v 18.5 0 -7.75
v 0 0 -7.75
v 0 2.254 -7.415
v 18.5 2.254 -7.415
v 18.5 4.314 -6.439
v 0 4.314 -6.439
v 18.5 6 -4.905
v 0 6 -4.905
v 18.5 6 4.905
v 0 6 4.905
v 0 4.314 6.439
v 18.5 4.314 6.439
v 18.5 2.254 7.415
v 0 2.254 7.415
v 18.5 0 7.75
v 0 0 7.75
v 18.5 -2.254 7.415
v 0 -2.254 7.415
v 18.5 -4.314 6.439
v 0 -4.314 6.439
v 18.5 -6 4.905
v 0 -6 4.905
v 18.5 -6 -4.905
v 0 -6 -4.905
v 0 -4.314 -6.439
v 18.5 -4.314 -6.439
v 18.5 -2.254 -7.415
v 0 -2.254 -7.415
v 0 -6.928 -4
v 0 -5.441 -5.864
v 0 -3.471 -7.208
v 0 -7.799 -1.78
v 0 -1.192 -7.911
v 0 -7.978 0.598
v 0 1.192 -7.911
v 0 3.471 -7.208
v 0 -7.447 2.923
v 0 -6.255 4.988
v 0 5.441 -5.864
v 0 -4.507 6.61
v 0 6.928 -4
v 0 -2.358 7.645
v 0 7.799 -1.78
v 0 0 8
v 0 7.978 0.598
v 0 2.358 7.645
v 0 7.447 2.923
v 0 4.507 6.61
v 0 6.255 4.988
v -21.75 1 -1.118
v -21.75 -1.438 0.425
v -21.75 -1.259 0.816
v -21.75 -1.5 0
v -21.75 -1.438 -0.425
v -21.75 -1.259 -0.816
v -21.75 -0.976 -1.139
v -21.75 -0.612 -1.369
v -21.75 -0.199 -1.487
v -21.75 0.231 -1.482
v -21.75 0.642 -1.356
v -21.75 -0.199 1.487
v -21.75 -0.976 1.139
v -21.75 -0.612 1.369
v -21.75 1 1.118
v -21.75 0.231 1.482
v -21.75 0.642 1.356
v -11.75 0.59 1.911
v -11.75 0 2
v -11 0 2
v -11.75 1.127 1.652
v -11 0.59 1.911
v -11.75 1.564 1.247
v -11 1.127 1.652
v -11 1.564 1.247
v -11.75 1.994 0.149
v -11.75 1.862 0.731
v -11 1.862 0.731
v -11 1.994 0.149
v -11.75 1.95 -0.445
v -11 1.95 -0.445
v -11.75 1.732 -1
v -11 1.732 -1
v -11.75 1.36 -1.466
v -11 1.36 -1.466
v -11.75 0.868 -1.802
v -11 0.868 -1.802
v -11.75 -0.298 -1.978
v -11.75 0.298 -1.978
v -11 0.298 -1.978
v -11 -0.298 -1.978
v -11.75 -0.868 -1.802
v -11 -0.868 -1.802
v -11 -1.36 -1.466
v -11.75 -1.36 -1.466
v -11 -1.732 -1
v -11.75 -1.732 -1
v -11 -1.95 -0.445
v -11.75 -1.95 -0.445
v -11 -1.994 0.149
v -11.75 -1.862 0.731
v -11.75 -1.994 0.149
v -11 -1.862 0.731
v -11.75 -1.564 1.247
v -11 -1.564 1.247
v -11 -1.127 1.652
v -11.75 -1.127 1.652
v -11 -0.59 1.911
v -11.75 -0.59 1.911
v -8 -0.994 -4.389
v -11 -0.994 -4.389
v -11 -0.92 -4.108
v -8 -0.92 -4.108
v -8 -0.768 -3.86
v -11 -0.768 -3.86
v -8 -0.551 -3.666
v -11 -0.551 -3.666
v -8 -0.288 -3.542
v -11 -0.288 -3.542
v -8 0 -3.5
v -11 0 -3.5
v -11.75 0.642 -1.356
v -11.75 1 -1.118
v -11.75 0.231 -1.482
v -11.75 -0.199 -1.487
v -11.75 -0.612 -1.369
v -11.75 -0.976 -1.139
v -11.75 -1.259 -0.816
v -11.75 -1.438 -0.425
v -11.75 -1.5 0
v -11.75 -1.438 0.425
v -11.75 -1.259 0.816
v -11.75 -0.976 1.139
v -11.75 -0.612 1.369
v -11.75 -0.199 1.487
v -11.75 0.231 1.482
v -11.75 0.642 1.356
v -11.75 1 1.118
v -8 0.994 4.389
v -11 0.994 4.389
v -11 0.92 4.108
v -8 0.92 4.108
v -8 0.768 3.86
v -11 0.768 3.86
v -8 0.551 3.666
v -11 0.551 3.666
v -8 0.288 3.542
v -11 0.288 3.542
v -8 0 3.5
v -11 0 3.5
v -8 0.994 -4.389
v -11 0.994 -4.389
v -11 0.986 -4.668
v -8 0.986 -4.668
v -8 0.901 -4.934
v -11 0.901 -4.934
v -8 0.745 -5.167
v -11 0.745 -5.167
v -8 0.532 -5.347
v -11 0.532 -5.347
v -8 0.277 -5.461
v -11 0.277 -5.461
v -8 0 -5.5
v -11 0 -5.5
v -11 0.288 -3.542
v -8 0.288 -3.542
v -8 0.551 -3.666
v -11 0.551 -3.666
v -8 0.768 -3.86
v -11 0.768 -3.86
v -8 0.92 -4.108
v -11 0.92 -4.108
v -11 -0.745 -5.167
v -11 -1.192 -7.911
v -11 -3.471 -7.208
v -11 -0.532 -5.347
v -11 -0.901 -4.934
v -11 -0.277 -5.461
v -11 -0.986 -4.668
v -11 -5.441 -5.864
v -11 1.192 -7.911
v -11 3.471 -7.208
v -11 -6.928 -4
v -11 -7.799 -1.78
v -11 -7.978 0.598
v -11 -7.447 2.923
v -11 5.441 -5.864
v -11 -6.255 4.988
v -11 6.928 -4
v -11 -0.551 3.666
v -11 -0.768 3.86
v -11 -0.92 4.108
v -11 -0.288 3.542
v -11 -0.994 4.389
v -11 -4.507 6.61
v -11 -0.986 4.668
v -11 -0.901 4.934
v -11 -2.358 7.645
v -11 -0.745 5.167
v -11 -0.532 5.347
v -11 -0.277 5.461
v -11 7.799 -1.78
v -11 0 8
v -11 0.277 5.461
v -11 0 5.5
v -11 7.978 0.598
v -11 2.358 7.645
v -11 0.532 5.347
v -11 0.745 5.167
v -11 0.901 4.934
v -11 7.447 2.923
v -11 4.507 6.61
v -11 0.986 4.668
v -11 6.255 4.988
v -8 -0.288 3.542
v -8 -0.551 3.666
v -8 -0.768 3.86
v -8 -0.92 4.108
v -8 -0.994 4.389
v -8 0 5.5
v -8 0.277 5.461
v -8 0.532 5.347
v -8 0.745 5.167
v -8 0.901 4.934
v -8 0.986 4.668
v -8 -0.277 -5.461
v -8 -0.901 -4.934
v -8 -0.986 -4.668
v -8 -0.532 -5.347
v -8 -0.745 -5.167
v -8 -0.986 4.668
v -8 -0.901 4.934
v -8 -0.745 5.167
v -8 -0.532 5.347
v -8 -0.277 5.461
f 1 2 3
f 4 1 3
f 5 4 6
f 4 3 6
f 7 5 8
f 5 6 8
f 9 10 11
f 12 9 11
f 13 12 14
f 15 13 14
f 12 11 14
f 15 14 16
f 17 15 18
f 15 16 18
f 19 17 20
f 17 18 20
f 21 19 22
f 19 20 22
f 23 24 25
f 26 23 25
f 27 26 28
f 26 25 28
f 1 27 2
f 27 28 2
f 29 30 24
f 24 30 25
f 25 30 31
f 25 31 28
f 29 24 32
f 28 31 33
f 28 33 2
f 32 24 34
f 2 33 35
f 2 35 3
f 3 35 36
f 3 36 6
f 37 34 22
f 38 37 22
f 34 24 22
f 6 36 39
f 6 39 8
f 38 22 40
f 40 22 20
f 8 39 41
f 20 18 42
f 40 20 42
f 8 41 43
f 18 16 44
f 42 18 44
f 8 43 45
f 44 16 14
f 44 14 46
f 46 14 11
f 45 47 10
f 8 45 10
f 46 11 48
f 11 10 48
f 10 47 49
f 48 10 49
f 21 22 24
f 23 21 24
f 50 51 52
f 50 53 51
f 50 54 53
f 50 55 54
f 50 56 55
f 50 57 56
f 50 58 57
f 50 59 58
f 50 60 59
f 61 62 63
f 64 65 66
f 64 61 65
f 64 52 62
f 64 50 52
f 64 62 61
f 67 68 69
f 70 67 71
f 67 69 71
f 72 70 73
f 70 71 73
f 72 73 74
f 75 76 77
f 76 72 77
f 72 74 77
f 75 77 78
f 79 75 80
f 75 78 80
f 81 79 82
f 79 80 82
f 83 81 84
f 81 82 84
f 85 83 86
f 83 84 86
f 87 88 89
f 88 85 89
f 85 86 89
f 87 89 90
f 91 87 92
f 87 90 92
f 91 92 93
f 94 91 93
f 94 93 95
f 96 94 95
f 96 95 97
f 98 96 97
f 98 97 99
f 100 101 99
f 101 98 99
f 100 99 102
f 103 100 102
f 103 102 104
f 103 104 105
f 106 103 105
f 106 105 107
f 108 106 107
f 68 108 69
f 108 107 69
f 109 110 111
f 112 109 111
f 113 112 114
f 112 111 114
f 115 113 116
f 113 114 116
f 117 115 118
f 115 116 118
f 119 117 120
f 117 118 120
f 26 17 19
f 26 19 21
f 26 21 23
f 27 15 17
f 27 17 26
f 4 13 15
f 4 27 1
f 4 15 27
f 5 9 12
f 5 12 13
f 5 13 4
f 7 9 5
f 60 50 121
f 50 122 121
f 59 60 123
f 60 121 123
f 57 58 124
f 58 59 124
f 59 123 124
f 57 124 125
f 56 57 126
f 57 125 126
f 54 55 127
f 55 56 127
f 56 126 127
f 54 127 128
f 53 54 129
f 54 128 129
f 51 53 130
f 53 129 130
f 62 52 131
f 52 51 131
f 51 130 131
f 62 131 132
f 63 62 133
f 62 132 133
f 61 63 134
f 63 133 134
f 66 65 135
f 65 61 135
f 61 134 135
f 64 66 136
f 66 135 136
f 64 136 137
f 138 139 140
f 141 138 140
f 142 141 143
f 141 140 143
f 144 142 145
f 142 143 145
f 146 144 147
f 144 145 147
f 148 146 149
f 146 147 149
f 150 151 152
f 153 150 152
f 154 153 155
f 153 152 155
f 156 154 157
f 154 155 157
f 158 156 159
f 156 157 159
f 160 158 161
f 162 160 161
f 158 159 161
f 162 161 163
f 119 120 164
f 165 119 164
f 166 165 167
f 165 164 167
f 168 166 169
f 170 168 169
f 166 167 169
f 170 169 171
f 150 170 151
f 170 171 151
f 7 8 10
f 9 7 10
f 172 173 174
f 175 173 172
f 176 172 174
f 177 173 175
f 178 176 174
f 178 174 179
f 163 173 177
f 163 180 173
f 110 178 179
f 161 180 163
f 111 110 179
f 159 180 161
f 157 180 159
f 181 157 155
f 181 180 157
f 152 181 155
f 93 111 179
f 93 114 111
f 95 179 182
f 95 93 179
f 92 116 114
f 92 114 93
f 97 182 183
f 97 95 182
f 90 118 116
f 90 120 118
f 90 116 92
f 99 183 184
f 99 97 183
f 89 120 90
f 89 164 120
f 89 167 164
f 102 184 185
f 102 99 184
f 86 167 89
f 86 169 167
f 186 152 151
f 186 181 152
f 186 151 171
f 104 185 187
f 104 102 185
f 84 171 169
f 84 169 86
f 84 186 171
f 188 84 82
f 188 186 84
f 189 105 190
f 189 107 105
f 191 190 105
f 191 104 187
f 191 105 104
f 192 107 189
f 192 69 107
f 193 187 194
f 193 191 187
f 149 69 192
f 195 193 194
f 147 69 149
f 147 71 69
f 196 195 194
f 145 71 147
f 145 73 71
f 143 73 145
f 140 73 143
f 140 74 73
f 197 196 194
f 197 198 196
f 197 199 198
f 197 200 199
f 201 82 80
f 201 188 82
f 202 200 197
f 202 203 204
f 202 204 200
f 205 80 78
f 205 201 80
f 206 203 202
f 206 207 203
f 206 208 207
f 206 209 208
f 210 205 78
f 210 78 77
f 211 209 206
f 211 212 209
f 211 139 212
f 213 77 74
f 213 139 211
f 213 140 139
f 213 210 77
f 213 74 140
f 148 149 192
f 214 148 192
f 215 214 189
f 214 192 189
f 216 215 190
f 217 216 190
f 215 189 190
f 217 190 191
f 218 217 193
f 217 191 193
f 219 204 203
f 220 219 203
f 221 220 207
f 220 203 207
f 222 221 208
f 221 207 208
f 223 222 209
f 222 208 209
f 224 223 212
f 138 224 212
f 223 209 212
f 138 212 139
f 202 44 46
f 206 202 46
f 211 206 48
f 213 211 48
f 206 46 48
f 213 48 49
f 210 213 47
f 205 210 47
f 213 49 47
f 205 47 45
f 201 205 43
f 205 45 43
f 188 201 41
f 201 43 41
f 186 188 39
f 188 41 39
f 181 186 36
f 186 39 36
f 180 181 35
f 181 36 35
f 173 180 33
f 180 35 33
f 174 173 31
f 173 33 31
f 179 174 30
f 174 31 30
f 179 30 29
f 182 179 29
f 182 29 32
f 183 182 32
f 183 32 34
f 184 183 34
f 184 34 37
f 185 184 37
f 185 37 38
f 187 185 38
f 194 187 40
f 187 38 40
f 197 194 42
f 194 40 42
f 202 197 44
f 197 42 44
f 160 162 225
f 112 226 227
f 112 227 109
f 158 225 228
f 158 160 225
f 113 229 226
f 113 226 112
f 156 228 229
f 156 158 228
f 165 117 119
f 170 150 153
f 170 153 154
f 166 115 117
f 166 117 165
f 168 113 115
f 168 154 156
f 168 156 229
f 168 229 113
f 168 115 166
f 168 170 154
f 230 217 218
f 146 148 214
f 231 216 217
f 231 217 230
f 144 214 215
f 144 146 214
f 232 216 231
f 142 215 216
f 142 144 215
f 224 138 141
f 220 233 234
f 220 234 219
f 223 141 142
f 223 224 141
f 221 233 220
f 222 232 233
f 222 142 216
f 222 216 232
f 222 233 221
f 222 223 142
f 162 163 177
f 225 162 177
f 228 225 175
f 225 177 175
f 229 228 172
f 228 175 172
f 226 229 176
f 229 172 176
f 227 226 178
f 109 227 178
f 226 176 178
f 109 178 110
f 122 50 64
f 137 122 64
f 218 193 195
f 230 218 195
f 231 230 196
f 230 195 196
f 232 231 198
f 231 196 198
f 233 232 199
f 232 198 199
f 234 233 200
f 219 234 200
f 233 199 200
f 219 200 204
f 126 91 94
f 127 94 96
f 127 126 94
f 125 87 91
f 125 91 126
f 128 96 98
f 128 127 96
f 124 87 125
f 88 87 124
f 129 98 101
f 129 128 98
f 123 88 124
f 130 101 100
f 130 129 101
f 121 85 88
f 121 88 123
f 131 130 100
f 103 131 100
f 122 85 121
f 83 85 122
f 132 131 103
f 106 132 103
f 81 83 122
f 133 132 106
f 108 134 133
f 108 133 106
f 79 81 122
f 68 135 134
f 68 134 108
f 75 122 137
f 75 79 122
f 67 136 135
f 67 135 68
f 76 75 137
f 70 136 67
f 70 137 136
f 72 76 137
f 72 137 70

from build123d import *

# Parameters (mm, degrees)
BOSS_EXTRUDE1_DEPTH = 18.5
SKETCH3_R           = 8
BOSS_EXTRUDE2_DEPTH = 11
SKETCH4_R           = 2
BOSS_EXTRUDE3_DEPTH = 0.75
SKETCH6_R           = 1.5
BOSS_EXTRUDE4_DEPTH = 10
CUT_EXTRUDE1_DEPTH  = 10
CUT_EXTRUDE2_DEPTH  = 3


with BuildPart() as part:
    # Sketch2 → Boss-Extrude1 (new body)
    with BuildSketch(Plane(origin=(0, 0, 0), x_dir=(0, 0, -1), z_dir=(1, 0, 0))):
        with BuildLine():
            Line((0, 6), (-4.905354218, 6))
            ThreePointArc((-4.905354218, 6), (-7.75, 0), (-4.905354218, -6))
            Line((-4.905354218, -6), (0, -6))
            Line((0, -6), (0, 6))
        make_face()
        with BuildLine():
            Line((4.905354218, 6), (0, 6))
            Line((0, 6), (0, -6))
            Line((0, -6), (4.905354218, -6))
            ThreePointArc((4.905354218, -6), (7.002820688, -3.320090723), (7.75, 0))
            ThreePointArc((7.75, 0), (7.002820688, 3.320090723), (4.905354218, 6))
        make_face()
    extrude(amount=BOSS_EXTRUDE1_DEPTH)

    # Sketch3 → Boss-Extrude2 (add)
    with BuildSketch(Plane.ZY):
        Circle(SKETCH3_R)
    extrude(amount=BOSS_EXTRUDE2_DEPTH)

    # Sketch4 → Boss-Extrude3 (add)
    with BuildSketch(Plane.ZY.offset(11)):
        Circle(SKETCH4_R)
    extrude(amount=BOSS_EXTRUDE3_DEPTH)

    # Sketch6 → Boss-Extrude4 (add)
    with BuildSketch(Plane.ZY.offset(11.75)):
        Circle(SKETCH6_R)
    extrude(amount=BOSS_EXTRUDE4_DEPTH)

    # Sketch7 → Cut-Extrude1 (cut)
    with BuildSketch(Plane.ZY.offset(21.75)):
        Polygon((-36.741347109, 1), (-1.118033989, 1), (1.118033989, 1), (36.741347109, 1), (36.741347109, 72.246626241), (-36.741347109, 72.246626241), align=None)
    extrude(amount=-CUT_EXTRUDE1_DEPTH, mode=Mode.SUBTRACT)

    # Sketch8 → Cut-Extrude2 (cut)
    with BuildSketch(Plane.ZY.offset(11)):
        with BuildLine():
            ThreePointArc((-4.388888889, -0.99380799), (-3.754644008, -0.666666667), (-3.5, 0))
            Line((-3.5, 0), (-4.5, 0))
            ThreePointArc((-4.5, 0), (-4.472135955, -0.5), (-4.388888889, -0.99380799))
        make_face()
        with BuildLine():
            Line((-4.5, 0), (-3.5, 0))
            ThreePointArc((-3.5, 0), (-3.754644008, 0.666666667), (-4.388888889, 0.99380799))
            ThreePointArc((-4.388888889, 0.99380799), (-4.472135955, 0.5), (-4.5, 0))
        make_face()
        with BuildLine():
            ThreePointArc((-4.5, 0), (-4.472135955, 0.5), (-4.388888889, 0.99380799))
            ThreePointArc((-4.388888889, 0.99380799), (-5.166666667, 0.745355992), (-5.5, 0))
            Line((-5.5, 0), (-4.5, 0))
        make_face()
        with BuildLine():
            ThreePointArc((-5.5, 0), (-5.166666667, -0.745355992), (-4.388888889, -0.99380799))
            ThreePointArc((-4.388888889, -0.99380799), (-4.472135955, -0.5), (-4.5, 0))
            Line((-4.5, 0), (-5.5, 0))
        make_face()
        with BuildLine():
            ThreePointArc((4.388888889, 0.99380799), (4.472135955, 0.5), (4.5, 0))
            Line((4.5, 0), (5.5, 0))
            ThreePointArc((5.5, 0), (5.166666667, 0.745355992), (4.388888889, 0.99380799))
        make_face()
        with BuildLine():
            ThreePointArc((4.388888889, -0.99380799), (4.472135955, -0.5), (4.5, 0))
            Line((4.5, 0), (3.5, 0))
            ThreePointArc((3.5, 0), (3.754644008, -0.666666667), (4.388888889, -0.99380799))
        make_face()
        with BuildLine():
            Line((3.5, 0), (4.5, 0))
            ThreePointArc((4.5, 0), (4.472135955, 0.5), (4.388888889, 0.99380799))
            ThreePointArc((4.388888889, 0.99380799), (3.754644008, 0.666666667), (3.5, 0))
        make_face()
        with BuildLine():
            Line((5.5, 0), (4.5, 0))
            ThreePointArc((4.5, 0), (4.472135955, -0.5), (4.388888889, -0.99380799))
            ThreePointArc((4.388888889, -0.99380799), (5.166666667, -0.745355992), (5.5, 0))
        make_face()
    extrude(amount=-CUT_EXTRUDE2_DEPTH, mode=Mode.SUBTRACT)


solid = part.part
